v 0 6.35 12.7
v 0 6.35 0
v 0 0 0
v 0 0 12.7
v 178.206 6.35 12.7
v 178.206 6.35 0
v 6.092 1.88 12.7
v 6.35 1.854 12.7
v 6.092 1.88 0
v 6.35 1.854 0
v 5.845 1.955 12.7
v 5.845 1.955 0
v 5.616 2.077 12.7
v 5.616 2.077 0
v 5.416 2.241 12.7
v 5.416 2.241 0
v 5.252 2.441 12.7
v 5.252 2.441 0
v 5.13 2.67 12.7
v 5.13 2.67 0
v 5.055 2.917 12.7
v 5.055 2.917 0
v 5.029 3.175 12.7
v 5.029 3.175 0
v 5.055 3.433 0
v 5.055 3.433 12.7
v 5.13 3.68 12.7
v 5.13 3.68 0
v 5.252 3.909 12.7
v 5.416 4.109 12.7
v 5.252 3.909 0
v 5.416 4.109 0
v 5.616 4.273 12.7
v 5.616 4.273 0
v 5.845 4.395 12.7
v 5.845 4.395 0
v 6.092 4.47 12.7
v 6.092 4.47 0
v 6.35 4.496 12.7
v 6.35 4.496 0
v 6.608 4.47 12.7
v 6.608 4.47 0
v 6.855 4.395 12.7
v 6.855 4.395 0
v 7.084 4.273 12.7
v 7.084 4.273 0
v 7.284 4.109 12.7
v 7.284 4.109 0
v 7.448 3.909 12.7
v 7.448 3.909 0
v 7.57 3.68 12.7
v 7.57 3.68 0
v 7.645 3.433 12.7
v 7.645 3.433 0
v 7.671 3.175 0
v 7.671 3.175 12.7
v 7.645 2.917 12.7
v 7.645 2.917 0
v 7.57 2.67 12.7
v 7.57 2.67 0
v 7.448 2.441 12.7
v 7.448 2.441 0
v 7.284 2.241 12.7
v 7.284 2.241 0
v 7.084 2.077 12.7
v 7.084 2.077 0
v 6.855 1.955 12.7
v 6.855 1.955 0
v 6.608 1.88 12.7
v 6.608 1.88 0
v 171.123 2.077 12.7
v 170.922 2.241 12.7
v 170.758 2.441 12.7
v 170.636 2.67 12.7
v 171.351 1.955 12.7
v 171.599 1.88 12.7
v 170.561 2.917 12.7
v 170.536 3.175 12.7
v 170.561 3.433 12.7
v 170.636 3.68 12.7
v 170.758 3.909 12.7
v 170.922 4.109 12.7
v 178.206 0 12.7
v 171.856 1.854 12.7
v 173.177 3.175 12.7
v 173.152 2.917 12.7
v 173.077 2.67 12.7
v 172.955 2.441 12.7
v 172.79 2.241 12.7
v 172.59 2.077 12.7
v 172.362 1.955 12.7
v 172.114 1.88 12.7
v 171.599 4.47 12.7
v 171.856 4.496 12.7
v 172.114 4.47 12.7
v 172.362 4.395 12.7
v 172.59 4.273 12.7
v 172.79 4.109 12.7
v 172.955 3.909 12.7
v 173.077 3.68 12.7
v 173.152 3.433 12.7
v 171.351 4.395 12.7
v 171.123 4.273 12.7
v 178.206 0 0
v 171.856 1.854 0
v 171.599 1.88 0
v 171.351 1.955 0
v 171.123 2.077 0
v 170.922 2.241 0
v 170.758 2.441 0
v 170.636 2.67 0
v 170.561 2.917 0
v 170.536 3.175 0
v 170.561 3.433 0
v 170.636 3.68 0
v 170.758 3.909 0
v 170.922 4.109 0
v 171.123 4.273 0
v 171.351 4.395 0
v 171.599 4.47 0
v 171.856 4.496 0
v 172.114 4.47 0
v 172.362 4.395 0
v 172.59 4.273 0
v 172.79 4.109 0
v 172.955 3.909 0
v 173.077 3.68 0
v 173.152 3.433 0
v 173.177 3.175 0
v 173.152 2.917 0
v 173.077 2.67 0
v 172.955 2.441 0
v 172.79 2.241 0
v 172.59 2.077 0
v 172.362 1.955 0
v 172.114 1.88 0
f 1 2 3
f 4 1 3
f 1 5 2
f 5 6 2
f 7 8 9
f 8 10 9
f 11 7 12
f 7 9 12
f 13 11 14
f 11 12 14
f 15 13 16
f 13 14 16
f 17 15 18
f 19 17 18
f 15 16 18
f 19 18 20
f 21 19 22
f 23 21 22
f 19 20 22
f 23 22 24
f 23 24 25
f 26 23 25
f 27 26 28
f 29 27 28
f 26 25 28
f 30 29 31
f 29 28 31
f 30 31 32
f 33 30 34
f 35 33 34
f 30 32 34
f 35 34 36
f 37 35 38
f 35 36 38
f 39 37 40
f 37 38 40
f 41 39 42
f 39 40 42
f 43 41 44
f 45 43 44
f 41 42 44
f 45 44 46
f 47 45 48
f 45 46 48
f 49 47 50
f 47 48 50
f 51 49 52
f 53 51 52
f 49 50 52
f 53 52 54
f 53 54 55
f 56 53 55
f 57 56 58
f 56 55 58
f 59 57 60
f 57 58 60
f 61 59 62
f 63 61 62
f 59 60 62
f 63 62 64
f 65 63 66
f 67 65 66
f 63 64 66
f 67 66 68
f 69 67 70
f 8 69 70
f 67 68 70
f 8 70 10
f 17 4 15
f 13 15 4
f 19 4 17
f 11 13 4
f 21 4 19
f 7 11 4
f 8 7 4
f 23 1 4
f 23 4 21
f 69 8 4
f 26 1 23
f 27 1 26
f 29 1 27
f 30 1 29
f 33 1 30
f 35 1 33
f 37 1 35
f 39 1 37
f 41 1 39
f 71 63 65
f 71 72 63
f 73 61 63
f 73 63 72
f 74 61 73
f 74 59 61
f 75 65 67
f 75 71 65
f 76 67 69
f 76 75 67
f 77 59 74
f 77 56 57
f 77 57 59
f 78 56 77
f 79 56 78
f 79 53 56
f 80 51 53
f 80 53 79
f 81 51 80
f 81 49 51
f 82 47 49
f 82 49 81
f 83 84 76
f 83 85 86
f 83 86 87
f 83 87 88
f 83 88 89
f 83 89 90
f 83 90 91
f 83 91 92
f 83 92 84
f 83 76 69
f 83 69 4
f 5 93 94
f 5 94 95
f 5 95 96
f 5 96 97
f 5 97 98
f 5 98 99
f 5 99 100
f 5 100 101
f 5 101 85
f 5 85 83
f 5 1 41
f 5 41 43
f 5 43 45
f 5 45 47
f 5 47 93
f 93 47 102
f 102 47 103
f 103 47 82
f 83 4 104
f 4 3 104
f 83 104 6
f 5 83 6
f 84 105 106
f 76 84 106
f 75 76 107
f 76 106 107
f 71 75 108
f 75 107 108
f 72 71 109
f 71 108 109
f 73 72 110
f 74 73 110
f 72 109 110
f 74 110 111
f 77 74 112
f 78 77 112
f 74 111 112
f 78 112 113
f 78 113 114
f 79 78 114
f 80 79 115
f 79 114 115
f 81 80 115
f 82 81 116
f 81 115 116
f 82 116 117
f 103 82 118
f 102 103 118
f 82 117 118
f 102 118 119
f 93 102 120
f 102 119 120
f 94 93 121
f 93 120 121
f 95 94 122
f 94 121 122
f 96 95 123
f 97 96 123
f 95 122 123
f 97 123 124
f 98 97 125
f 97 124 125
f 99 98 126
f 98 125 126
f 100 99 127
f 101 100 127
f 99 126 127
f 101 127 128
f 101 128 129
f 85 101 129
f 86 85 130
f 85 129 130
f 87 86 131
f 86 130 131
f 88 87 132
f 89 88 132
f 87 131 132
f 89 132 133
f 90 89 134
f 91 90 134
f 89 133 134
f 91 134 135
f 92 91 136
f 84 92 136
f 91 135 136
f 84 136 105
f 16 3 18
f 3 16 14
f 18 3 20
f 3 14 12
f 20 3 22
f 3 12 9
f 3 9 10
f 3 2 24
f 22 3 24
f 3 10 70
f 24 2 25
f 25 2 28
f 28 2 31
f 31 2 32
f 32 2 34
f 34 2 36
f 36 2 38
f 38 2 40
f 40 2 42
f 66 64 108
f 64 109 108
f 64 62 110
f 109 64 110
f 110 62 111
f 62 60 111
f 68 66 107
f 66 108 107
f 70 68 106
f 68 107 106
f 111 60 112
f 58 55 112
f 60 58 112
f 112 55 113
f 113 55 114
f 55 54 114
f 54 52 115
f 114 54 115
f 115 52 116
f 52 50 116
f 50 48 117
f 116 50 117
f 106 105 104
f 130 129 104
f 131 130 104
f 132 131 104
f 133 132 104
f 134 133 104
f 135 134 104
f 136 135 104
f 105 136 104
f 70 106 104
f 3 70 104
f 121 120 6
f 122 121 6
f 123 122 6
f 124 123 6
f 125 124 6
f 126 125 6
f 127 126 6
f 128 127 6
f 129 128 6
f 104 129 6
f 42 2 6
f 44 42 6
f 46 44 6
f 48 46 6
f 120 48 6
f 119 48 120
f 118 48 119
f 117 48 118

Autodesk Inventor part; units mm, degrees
ref_plane "YZ Plane" through (0, 0, 0) normal (1, 0, 0) x (0, 1, 0)
ref_plane "XZ Plane" through (0, 0, 0) normal (0, 1, 0) x (-1, 0, 0)
ref_plane "XY Plane" through (0, 0, 0) normal (0, 0, 1) x (1, 0, 0)
sketch "Sketch1" plane through (0, 0, 0) normal (0, 0, 1) x (1, 0, 0)
  line L0 (0, 0) -> (178.2064, 0)
  line L1 (178.2064, 0) -> (178.2064, 6.35)
  line L2 (178.2064, 6.35) -> (0, 6.35)
  line L3 (0, 6.35) -> (0, 0)
  dimension "d0" = 178.2064
  dimension "d1" = 6.35
extrude "Extrusion1" add sketch "Sketch1" along normal blind 12.7
sketch "Sketch2" plane through (0, 0, 12.7) normal (0, 0, 1) x (1, 0, 0)
  line L0 (0, 6.35) -> (0, 0) projected
  line L1 (0, 3.175) -> (6.35, 3.175)
  line L2 (178.2064, 0) -> (178.2064, 6.35) projected
  line L3 (178.2064, 3.175) -> (171.8564, 3.175)
  circle A0 centre (171.8564, 3.175) radius 1.778
  circle A1 centre (6.35, 3.175) radius 1.778
  dimension "d4" = 6.35
  dimension "d5" = 6.35
  dimension "d6" = 3.556
  dimension "d7" = 3.556
hole "Hole1" at (6.35, 3.175, 12.7) at (171.8564, 3.175, 12.7) direction (0, 0, -1) diameter 2.6416 depth 12.7 tip angle 118 thread size "6-32 UNC" class "2B" standard "ANSI Unified Screw Threads"
properties part number "GlyphPlateBackSide"
